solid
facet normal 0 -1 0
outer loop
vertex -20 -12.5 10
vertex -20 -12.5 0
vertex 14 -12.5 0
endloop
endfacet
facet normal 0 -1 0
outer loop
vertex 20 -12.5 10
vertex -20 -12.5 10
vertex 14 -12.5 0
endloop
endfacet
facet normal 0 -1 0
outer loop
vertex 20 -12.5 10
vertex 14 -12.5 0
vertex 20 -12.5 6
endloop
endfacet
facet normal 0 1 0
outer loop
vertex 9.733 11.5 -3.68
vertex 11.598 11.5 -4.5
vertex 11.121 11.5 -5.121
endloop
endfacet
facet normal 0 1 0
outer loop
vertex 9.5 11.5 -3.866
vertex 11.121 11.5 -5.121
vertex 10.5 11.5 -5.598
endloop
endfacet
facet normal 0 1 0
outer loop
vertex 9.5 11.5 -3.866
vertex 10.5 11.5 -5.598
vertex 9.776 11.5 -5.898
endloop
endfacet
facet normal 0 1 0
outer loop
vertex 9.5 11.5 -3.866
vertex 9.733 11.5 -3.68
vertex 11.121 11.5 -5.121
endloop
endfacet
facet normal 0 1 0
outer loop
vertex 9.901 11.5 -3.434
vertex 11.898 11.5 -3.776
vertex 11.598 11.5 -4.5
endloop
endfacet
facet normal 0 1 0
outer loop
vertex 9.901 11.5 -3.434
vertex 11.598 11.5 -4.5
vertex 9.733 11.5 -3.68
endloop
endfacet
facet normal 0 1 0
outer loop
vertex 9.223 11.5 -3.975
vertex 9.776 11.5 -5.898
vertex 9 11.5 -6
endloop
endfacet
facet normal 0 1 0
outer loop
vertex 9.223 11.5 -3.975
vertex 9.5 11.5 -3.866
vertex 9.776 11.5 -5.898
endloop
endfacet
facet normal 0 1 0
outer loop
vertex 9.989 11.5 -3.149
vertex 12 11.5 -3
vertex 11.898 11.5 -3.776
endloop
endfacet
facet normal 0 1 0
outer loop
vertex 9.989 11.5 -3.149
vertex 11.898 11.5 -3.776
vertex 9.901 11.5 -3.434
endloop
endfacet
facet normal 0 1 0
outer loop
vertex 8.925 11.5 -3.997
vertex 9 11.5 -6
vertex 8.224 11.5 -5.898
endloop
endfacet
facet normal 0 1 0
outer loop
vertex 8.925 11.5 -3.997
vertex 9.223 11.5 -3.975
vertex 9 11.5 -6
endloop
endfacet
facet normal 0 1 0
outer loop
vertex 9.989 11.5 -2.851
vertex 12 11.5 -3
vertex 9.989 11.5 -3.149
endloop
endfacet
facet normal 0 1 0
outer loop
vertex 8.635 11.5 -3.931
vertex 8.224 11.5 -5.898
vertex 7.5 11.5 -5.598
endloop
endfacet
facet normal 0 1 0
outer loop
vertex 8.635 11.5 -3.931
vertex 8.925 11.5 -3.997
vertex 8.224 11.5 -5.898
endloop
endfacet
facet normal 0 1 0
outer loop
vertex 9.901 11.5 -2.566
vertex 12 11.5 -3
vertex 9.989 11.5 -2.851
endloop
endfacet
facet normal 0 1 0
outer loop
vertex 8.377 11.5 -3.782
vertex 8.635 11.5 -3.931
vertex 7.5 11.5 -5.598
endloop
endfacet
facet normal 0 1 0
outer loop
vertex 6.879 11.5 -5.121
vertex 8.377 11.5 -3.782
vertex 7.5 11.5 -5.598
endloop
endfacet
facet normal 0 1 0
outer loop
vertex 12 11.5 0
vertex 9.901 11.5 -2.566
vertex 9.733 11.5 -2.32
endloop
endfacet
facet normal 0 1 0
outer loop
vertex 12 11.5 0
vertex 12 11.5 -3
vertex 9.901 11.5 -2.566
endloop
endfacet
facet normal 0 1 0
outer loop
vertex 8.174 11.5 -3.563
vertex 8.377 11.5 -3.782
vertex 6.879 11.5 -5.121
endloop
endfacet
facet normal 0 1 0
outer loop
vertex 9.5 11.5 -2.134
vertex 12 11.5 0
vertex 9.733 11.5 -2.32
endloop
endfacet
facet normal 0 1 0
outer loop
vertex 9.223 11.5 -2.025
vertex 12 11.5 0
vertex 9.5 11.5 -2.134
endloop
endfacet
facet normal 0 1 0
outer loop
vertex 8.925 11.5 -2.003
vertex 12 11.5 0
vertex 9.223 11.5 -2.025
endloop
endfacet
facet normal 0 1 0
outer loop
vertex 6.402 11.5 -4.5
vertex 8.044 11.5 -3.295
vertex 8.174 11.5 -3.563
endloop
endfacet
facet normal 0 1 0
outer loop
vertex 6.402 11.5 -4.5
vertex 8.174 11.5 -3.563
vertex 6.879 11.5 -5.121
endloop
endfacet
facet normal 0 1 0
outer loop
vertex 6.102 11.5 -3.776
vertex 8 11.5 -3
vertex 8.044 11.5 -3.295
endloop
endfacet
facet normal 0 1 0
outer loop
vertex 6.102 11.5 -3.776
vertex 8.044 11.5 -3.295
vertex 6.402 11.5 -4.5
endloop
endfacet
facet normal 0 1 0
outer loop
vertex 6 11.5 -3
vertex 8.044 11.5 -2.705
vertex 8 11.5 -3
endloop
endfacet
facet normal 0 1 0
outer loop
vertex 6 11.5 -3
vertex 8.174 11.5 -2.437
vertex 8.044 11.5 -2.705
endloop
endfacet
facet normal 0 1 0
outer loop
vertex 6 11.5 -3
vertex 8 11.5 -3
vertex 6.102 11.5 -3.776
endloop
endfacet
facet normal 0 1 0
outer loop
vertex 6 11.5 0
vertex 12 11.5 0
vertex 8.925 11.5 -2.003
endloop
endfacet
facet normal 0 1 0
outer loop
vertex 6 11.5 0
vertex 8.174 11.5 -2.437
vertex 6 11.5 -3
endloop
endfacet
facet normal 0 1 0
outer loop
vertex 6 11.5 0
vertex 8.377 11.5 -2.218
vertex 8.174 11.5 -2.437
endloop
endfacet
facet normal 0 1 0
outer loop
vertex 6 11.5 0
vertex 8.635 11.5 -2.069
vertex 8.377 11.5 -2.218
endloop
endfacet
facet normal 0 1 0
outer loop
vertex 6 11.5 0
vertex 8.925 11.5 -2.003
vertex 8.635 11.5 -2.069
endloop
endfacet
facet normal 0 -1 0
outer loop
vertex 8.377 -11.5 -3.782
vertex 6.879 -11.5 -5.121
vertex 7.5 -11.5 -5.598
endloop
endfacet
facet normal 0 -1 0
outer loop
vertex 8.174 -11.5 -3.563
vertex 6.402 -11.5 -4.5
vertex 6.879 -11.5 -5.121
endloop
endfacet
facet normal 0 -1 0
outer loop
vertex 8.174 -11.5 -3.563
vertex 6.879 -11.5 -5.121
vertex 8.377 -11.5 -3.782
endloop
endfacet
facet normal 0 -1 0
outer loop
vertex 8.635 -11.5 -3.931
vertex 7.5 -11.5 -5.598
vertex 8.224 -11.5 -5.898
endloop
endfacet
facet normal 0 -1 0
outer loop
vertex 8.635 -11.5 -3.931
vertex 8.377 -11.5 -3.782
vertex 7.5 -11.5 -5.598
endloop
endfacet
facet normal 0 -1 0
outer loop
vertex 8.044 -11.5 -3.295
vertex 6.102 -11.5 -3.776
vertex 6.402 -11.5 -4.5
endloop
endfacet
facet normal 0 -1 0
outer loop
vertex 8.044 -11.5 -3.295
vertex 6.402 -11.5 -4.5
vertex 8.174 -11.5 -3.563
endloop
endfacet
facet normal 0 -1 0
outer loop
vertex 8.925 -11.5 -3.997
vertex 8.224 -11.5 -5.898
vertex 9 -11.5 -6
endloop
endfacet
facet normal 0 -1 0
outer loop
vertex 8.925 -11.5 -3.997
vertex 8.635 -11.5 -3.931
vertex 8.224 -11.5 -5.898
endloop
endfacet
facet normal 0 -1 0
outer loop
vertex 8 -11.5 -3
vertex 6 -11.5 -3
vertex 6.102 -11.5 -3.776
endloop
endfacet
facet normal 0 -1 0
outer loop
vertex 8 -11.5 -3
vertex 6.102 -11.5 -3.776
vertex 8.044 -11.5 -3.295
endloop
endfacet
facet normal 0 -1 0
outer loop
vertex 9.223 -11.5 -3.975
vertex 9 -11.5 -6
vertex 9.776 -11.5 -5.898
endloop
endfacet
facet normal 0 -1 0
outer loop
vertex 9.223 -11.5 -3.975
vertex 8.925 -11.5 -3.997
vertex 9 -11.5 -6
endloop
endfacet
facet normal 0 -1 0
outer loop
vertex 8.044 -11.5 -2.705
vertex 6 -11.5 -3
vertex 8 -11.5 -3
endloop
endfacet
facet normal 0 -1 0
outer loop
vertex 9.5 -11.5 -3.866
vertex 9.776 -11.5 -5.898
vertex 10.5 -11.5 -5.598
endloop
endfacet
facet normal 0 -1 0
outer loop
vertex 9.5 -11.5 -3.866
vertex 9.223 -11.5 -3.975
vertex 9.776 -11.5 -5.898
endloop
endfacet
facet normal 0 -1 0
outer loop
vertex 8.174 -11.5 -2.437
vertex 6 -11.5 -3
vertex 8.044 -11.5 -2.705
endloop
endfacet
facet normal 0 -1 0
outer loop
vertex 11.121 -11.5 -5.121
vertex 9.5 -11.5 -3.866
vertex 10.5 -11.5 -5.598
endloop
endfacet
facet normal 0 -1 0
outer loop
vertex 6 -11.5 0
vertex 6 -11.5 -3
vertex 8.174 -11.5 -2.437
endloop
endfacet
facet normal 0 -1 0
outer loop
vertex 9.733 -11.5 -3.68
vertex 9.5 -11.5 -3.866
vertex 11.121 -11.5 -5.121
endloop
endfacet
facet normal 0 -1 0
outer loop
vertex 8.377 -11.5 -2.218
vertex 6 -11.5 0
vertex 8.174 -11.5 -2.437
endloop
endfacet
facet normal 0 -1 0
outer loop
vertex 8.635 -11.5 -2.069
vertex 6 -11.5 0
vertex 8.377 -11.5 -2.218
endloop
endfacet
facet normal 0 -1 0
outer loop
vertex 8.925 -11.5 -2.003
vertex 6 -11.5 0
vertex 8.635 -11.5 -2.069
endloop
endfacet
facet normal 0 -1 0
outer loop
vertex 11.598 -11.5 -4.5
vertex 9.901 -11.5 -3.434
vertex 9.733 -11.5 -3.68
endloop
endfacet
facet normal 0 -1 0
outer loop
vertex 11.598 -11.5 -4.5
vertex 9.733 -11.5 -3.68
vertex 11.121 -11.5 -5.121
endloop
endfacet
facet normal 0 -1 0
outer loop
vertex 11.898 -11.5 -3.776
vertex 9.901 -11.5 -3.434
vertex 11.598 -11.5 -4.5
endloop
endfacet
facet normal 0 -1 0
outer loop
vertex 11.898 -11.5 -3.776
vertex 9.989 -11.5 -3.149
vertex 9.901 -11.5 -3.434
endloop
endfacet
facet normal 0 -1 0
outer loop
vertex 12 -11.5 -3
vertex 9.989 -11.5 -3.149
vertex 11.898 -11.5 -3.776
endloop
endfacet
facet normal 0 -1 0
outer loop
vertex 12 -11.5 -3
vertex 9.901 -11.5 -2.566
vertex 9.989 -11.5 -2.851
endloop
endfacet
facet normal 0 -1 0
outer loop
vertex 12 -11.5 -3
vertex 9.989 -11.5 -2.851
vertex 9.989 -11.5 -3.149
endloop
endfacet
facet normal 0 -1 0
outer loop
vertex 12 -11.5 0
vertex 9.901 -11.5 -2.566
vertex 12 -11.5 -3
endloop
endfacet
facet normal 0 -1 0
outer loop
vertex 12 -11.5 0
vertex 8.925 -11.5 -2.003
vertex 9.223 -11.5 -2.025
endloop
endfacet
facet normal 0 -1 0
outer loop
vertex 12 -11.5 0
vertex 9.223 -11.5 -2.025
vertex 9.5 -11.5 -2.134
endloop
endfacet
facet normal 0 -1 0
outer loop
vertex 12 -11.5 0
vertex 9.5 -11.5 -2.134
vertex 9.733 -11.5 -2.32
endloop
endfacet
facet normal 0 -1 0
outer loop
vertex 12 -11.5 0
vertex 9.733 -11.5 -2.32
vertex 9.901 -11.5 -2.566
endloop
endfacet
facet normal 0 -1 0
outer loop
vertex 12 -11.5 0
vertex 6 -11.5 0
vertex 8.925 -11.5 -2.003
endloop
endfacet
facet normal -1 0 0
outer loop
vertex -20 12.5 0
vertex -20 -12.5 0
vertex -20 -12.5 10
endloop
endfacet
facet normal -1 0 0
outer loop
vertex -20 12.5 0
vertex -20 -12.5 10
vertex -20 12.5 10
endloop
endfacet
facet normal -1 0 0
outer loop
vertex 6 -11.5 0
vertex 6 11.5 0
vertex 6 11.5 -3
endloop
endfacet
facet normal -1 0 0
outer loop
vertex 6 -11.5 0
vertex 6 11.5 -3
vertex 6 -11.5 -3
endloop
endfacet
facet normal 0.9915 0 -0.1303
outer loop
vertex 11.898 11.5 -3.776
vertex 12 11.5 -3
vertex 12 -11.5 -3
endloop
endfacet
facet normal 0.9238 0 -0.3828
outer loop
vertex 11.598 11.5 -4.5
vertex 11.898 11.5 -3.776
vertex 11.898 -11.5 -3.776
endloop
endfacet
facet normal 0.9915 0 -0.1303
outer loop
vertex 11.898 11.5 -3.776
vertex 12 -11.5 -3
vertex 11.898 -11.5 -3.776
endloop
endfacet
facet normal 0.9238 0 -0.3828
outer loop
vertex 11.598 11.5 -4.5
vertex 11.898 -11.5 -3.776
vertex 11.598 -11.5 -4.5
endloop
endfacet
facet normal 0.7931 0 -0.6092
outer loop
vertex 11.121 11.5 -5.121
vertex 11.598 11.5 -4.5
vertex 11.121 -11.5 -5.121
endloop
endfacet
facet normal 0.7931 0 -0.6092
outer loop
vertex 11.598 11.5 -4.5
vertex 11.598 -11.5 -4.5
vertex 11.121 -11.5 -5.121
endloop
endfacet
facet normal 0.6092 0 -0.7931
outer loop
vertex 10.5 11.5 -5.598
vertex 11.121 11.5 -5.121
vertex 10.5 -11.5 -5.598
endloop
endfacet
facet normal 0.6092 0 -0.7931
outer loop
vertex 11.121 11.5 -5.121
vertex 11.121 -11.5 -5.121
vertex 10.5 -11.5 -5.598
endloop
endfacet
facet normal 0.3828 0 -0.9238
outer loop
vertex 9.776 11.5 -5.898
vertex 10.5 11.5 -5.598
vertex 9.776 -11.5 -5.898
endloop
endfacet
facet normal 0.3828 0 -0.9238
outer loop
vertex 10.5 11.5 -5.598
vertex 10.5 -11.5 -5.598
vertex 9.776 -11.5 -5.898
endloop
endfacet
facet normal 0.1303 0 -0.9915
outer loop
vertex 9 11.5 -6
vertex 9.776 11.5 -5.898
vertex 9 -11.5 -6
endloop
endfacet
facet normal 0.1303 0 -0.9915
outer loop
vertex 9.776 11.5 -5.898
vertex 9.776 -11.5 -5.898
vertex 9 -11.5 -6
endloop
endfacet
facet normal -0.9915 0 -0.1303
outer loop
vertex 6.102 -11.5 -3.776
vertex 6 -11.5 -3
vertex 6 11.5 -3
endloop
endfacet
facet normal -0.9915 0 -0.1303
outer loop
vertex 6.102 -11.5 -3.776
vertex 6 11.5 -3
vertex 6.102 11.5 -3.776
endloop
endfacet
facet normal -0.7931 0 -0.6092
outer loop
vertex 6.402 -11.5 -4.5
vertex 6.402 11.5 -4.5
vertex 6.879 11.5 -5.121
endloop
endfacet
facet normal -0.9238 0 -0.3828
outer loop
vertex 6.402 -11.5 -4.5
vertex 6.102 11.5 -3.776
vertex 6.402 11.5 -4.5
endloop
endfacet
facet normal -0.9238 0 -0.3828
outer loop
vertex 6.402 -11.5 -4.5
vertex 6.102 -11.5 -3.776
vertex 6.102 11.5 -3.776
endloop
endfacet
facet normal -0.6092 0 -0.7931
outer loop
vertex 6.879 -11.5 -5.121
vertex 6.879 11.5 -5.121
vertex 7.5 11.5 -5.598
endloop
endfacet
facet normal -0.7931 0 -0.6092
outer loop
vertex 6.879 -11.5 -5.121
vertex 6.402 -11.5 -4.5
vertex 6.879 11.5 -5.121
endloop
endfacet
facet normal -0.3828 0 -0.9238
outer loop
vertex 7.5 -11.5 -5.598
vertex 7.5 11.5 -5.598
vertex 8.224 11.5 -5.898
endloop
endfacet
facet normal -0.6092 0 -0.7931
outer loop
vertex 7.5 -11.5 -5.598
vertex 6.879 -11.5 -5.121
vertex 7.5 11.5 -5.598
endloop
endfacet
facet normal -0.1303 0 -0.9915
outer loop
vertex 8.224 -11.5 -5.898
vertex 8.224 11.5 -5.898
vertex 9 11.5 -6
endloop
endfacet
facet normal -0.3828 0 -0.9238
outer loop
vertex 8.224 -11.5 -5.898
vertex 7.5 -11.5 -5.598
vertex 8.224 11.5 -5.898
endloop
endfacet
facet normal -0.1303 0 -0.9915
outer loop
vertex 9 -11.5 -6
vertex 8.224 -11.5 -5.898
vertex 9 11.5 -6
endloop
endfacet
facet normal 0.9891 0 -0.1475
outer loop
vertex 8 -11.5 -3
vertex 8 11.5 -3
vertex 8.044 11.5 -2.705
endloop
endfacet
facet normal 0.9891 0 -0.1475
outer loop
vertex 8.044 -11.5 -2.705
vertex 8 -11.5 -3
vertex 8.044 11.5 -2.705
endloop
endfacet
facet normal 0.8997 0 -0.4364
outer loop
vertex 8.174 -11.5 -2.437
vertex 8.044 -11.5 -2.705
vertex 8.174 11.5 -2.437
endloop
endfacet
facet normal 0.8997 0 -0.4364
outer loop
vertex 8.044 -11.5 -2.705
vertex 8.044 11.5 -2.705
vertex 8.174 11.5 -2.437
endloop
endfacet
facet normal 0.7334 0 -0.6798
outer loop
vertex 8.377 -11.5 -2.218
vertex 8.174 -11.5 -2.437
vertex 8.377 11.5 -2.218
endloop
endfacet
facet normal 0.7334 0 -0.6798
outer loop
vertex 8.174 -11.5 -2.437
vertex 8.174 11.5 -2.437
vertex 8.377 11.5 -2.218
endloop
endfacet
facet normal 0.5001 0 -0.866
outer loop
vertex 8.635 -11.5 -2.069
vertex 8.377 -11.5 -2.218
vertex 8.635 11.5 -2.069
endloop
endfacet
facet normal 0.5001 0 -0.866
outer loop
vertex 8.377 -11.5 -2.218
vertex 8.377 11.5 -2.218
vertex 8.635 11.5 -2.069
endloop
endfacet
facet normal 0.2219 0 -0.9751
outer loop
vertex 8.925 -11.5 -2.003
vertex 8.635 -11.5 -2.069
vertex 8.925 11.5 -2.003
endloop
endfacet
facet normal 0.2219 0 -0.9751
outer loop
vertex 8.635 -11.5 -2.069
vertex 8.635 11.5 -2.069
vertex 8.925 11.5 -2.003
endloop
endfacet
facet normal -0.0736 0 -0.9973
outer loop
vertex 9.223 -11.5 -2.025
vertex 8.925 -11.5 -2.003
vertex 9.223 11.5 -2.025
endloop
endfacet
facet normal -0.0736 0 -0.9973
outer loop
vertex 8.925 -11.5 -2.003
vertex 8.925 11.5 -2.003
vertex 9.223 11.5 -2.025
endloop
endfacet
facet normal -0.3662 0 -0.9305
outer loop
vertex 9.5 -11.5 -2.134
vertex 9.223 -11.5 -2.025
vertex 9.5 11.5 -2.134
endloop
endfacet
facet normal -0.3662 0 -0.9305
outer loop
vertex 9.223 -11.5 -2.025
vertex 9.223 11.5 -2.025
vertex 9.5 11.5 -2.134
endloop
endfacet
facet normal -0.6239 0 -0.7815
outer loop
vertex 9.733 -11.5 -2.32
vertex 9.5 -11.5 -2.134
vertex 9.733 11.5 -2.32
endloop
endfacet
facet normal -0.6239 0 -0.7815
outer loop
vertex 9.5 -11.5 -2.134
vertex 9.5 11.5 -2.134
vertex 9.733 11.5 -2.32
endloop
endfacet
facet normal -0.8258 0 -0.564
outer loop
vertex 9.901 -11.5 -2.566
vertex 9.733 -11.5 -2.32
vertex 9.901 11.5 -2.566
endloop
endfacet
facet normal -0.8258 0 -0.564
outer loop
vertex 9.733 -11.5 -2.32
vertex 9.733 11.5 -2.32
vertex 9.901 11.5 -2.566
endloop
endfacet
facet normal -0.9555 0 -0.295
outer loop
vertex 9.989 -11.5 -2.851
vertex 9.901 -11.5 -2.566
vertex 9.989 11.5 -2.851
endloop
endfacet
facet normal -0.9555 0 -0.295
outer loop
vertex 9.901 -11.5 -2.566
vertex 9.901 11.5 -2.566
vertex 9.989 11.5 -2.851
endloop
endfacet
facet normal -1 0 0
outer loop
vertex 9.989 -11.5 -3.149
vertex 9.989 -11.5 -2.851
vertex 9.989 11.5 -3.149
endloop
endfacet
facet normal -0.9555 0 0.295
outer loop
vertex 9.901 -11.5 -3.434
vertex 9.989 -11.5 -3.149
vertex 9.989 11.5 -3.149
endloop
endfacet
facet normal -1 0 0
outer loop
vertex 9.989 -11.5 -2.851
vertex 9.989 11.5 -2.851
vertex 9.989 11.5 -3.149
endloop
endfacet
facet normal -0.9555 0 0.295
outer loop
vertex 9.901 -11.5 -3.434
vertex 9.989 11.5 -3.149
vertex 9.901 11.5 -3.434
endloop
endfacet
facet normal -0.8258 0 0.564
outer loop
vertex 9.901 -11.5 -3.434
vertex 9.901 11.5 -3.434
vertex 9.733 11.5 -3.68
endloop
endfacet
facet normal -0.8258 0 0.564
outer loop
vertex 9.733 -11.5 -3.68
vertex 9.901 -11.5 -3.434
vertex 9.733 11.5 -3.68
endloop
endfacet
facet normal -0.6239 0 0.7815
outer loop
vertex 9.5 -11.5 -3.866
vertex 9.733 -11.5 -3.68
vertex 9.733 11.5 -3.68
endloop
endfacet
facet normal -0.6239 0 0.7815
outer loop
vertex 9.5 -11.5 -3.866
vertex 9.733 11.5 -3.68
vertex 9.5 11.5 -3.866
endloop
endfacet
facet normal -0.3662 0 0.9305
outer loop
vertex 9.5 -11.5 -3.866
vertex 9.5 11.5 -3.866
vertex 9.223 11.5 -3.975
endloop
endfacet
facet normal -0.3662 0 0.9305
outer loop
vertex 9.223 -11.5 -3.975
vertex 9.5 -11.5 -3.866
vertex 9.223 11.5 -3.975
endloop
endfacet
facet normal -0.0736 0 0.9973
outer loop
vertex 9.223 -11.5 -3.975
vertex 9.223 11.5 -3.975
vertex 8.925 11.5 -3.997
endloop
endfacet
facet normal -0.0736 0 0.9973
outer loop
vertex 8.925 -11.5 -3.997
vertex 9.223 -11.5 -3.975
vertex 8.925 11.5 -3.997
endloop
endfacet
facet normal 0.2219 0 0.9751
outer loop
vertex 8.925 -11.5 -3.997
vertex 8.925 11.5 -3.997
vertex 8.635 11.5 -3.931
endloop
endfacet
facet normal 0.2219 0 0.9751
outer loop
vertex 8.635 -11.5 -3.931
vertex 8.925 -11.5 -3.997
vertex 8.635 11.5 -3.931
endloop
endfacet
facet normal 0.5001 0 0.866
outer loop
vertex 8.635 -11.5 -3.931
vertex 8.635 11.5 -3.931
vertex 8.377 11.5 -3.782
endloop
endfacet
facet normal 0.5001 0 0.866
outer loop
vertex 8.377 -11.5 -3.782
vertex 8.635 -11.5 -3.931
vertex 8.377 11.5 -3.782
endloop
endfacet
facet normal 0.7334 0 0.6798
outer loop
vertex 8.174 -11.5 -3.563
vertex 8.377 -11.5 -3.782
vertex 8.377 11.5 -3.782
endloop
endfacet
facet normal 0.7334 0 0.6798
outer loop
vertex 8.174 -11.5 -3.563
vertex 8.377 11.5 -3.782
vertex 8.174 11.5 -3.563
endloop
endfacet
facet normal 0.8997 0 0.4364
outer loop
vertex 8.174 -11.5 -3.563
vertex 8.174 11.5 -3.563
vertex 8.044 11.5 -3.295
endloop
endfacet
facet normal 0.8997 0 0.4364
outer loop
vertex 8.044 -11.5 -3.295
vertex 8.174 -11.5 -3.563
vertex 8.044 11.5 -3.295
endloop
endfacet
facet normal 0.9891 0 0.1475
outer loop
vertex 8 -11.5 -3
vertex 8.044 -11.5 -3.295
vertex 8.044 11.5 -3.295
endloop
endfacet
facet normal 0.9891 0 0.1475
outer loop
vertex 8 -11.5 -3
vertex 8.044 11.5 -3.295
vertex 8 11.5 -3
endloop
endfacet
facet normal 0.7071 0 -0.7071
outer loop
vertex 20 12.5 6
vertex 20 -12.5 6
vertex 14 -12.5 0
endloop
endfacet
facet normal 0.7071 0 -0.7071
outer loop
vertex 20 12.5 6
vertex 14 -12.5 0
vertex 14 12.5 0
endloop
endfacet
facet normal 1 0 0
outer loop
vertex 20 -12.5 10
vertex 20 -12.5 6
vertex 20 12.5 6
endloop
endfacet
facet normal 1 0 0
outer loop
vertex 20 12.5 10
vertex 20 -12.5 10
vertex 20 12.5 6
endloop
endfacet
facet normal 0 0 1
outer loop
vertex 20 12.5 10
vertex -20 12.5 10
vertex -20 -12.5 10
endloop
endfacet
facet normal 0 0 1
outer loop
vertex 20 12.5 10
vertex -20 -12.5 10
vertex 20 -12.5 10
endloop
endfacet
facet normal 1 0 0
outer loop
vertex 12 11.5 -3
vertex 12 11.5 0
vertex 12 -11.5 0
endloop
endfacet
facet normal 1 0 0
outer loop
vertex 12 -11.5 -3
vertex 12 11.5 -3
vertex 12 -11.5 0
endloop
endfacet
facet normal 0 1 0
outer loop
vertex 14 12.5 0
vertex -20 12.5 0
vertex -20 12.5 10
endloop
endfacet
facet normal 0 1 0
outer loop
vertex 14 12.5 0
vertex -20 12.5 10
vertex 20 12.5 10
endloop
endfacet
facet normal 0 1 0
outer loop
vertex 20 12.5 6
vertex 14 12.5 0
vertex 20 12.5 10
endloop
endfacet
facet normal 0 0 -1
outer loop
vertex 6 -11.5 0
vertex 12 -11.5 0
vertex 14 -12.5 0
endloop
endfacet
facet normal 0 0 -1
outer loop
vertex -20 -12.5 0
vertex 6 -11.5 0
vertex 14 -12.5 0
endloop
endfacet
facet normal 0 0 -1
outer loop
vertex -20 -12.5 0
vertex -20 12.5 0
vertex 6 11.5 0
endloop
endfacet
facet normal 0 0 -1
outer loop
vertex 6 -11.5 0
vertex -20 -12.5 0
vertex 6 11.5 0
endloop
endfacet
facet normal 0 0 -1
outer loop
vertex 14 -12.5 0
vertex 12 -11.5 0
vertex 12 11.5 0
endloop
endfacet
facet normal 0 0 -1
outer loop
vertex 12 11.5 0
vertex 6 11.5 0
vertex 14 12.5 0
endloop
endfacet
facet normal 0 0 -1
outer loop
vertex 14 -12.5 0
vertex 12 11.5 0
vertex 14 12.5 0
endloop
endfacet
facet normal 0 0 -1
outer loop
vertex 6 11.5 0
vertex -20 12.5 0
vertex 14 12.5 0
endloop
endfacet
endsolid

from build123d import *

# Parameters (mm, degrees)
F0_W      = 40
F0_H      = 25
F1_DEPTH  = 10
F2_W      = 6
F2_H      = 25
F3_DEPTH  = 6
F4_R      = 2.99999
F5_R      = 1
F6_DEPTH  = 30
F7_SIZE   = 6
F8_R      = 1
F9_DEPTH  = 1
F10_R     = 1
F11_DEPTH = 1


# Not quite as in the source:
# - a fillet or chamfer is up to 0.001 mm smaller than in the source, because OpenCascade refuses the exact size
# - ends of sketch curves that miss each other by under 0.0002 mm in the source are joined


with BuildPart() as f1:
    # F0 (on Top) → F1 (new body)
    with BuildSketch(Plane.XY):
        Rectangle(F0_W, F0_H)
    extrude(amount=F1_DEPTH)

    # F2 (on face) → F3 (join)
    with BuildSketch(Plane(origin=(0, 0, 0), x_dir=(1, 0, 0), z_dir=(0, 0, -1))):
        with Locations((9, 0)):
            Rectangle(F2_W, F2_H)
    extrude(amount=F3_DEPTH)

    # F4 (radius 3 in the source; OpenCascade refuses exactly that, so slightly less here)
    f4_edges = [f1.edges().sort_by_distance(p)[0] for p in [
        (6, 0, -6),
        (12, 0, -6),
    ]]
    fillet(f4_edges, radius=F4_R)

    # F5 (on face) → F6 (cut)
    with BuildSketch(Plane(origin=(0, 12.5, 0), x_dir=(-1, 0, 0), z_dir=(0, 1, 0))):
        with Locations((-9, -3)):
            Circle(F5_R)
    extrude(amount=-F6_DEPTH, mode=Mode.SUBTRACT)

    # F7
    f7_edges = [f1.edges().sort_by_distance(p)[0] for p in [
        (20, 0, 0),
    ]]
    chamfer(f7_edges, length=F7_SIZE)

    # F8 (on face) → F9 (cut)
    with BuildSketch(Plane(origin=(0, 12.5, 0), x_dir=(-1, 0, 0), z_dir=(0, 1, 0))):
        with BuildLine():
            Line((-6, -3.00001), (-6, 0))
            Line((-6, 0), (-12, 0))
            Line((-12, 0), (-12, -3.00001))
            ThreePointArc((-12, -3.00001), (-11.1213232725, -5.1213232725), (-9.00001, -6))
            ThreePointArc((-9.00001, -6), (-6.8786767275, -5.1213232725), (-6, -3.00001))
        make_face()
        with Locations((-9, -3)):
            Circle(F8_R, mode=Mode.SUBTRACT)
    extrude(amount=-F9_DEPTH, mode=Mode.SUBTRACT)

    # F10 (on face) → F11 (cut)
    with BuildSketch(Plane.XZ.offset(12.5)):
        with BuildLine():
            Line((12, 0), (6, 0))
            Line((6, 0), (6, -3.00001))
            ThreePointArc((6, -3.00001), (6.8786767275, -5.1213232725), (8.99999, -6))
            ThreePointArc((8.99999, -6), (11.1213232725, -5.1213232725), (12, -3.00001))
            Line((12, -3.00001), (12, 0))
        make_face()
        with Locations((9, -3)):
            Circle(F10_R, mode=Mode.SUBTRACT)
    extrude(amount=-F11_DEPTH, mode=Mode.SUBTRACT)


solid = f1.part
